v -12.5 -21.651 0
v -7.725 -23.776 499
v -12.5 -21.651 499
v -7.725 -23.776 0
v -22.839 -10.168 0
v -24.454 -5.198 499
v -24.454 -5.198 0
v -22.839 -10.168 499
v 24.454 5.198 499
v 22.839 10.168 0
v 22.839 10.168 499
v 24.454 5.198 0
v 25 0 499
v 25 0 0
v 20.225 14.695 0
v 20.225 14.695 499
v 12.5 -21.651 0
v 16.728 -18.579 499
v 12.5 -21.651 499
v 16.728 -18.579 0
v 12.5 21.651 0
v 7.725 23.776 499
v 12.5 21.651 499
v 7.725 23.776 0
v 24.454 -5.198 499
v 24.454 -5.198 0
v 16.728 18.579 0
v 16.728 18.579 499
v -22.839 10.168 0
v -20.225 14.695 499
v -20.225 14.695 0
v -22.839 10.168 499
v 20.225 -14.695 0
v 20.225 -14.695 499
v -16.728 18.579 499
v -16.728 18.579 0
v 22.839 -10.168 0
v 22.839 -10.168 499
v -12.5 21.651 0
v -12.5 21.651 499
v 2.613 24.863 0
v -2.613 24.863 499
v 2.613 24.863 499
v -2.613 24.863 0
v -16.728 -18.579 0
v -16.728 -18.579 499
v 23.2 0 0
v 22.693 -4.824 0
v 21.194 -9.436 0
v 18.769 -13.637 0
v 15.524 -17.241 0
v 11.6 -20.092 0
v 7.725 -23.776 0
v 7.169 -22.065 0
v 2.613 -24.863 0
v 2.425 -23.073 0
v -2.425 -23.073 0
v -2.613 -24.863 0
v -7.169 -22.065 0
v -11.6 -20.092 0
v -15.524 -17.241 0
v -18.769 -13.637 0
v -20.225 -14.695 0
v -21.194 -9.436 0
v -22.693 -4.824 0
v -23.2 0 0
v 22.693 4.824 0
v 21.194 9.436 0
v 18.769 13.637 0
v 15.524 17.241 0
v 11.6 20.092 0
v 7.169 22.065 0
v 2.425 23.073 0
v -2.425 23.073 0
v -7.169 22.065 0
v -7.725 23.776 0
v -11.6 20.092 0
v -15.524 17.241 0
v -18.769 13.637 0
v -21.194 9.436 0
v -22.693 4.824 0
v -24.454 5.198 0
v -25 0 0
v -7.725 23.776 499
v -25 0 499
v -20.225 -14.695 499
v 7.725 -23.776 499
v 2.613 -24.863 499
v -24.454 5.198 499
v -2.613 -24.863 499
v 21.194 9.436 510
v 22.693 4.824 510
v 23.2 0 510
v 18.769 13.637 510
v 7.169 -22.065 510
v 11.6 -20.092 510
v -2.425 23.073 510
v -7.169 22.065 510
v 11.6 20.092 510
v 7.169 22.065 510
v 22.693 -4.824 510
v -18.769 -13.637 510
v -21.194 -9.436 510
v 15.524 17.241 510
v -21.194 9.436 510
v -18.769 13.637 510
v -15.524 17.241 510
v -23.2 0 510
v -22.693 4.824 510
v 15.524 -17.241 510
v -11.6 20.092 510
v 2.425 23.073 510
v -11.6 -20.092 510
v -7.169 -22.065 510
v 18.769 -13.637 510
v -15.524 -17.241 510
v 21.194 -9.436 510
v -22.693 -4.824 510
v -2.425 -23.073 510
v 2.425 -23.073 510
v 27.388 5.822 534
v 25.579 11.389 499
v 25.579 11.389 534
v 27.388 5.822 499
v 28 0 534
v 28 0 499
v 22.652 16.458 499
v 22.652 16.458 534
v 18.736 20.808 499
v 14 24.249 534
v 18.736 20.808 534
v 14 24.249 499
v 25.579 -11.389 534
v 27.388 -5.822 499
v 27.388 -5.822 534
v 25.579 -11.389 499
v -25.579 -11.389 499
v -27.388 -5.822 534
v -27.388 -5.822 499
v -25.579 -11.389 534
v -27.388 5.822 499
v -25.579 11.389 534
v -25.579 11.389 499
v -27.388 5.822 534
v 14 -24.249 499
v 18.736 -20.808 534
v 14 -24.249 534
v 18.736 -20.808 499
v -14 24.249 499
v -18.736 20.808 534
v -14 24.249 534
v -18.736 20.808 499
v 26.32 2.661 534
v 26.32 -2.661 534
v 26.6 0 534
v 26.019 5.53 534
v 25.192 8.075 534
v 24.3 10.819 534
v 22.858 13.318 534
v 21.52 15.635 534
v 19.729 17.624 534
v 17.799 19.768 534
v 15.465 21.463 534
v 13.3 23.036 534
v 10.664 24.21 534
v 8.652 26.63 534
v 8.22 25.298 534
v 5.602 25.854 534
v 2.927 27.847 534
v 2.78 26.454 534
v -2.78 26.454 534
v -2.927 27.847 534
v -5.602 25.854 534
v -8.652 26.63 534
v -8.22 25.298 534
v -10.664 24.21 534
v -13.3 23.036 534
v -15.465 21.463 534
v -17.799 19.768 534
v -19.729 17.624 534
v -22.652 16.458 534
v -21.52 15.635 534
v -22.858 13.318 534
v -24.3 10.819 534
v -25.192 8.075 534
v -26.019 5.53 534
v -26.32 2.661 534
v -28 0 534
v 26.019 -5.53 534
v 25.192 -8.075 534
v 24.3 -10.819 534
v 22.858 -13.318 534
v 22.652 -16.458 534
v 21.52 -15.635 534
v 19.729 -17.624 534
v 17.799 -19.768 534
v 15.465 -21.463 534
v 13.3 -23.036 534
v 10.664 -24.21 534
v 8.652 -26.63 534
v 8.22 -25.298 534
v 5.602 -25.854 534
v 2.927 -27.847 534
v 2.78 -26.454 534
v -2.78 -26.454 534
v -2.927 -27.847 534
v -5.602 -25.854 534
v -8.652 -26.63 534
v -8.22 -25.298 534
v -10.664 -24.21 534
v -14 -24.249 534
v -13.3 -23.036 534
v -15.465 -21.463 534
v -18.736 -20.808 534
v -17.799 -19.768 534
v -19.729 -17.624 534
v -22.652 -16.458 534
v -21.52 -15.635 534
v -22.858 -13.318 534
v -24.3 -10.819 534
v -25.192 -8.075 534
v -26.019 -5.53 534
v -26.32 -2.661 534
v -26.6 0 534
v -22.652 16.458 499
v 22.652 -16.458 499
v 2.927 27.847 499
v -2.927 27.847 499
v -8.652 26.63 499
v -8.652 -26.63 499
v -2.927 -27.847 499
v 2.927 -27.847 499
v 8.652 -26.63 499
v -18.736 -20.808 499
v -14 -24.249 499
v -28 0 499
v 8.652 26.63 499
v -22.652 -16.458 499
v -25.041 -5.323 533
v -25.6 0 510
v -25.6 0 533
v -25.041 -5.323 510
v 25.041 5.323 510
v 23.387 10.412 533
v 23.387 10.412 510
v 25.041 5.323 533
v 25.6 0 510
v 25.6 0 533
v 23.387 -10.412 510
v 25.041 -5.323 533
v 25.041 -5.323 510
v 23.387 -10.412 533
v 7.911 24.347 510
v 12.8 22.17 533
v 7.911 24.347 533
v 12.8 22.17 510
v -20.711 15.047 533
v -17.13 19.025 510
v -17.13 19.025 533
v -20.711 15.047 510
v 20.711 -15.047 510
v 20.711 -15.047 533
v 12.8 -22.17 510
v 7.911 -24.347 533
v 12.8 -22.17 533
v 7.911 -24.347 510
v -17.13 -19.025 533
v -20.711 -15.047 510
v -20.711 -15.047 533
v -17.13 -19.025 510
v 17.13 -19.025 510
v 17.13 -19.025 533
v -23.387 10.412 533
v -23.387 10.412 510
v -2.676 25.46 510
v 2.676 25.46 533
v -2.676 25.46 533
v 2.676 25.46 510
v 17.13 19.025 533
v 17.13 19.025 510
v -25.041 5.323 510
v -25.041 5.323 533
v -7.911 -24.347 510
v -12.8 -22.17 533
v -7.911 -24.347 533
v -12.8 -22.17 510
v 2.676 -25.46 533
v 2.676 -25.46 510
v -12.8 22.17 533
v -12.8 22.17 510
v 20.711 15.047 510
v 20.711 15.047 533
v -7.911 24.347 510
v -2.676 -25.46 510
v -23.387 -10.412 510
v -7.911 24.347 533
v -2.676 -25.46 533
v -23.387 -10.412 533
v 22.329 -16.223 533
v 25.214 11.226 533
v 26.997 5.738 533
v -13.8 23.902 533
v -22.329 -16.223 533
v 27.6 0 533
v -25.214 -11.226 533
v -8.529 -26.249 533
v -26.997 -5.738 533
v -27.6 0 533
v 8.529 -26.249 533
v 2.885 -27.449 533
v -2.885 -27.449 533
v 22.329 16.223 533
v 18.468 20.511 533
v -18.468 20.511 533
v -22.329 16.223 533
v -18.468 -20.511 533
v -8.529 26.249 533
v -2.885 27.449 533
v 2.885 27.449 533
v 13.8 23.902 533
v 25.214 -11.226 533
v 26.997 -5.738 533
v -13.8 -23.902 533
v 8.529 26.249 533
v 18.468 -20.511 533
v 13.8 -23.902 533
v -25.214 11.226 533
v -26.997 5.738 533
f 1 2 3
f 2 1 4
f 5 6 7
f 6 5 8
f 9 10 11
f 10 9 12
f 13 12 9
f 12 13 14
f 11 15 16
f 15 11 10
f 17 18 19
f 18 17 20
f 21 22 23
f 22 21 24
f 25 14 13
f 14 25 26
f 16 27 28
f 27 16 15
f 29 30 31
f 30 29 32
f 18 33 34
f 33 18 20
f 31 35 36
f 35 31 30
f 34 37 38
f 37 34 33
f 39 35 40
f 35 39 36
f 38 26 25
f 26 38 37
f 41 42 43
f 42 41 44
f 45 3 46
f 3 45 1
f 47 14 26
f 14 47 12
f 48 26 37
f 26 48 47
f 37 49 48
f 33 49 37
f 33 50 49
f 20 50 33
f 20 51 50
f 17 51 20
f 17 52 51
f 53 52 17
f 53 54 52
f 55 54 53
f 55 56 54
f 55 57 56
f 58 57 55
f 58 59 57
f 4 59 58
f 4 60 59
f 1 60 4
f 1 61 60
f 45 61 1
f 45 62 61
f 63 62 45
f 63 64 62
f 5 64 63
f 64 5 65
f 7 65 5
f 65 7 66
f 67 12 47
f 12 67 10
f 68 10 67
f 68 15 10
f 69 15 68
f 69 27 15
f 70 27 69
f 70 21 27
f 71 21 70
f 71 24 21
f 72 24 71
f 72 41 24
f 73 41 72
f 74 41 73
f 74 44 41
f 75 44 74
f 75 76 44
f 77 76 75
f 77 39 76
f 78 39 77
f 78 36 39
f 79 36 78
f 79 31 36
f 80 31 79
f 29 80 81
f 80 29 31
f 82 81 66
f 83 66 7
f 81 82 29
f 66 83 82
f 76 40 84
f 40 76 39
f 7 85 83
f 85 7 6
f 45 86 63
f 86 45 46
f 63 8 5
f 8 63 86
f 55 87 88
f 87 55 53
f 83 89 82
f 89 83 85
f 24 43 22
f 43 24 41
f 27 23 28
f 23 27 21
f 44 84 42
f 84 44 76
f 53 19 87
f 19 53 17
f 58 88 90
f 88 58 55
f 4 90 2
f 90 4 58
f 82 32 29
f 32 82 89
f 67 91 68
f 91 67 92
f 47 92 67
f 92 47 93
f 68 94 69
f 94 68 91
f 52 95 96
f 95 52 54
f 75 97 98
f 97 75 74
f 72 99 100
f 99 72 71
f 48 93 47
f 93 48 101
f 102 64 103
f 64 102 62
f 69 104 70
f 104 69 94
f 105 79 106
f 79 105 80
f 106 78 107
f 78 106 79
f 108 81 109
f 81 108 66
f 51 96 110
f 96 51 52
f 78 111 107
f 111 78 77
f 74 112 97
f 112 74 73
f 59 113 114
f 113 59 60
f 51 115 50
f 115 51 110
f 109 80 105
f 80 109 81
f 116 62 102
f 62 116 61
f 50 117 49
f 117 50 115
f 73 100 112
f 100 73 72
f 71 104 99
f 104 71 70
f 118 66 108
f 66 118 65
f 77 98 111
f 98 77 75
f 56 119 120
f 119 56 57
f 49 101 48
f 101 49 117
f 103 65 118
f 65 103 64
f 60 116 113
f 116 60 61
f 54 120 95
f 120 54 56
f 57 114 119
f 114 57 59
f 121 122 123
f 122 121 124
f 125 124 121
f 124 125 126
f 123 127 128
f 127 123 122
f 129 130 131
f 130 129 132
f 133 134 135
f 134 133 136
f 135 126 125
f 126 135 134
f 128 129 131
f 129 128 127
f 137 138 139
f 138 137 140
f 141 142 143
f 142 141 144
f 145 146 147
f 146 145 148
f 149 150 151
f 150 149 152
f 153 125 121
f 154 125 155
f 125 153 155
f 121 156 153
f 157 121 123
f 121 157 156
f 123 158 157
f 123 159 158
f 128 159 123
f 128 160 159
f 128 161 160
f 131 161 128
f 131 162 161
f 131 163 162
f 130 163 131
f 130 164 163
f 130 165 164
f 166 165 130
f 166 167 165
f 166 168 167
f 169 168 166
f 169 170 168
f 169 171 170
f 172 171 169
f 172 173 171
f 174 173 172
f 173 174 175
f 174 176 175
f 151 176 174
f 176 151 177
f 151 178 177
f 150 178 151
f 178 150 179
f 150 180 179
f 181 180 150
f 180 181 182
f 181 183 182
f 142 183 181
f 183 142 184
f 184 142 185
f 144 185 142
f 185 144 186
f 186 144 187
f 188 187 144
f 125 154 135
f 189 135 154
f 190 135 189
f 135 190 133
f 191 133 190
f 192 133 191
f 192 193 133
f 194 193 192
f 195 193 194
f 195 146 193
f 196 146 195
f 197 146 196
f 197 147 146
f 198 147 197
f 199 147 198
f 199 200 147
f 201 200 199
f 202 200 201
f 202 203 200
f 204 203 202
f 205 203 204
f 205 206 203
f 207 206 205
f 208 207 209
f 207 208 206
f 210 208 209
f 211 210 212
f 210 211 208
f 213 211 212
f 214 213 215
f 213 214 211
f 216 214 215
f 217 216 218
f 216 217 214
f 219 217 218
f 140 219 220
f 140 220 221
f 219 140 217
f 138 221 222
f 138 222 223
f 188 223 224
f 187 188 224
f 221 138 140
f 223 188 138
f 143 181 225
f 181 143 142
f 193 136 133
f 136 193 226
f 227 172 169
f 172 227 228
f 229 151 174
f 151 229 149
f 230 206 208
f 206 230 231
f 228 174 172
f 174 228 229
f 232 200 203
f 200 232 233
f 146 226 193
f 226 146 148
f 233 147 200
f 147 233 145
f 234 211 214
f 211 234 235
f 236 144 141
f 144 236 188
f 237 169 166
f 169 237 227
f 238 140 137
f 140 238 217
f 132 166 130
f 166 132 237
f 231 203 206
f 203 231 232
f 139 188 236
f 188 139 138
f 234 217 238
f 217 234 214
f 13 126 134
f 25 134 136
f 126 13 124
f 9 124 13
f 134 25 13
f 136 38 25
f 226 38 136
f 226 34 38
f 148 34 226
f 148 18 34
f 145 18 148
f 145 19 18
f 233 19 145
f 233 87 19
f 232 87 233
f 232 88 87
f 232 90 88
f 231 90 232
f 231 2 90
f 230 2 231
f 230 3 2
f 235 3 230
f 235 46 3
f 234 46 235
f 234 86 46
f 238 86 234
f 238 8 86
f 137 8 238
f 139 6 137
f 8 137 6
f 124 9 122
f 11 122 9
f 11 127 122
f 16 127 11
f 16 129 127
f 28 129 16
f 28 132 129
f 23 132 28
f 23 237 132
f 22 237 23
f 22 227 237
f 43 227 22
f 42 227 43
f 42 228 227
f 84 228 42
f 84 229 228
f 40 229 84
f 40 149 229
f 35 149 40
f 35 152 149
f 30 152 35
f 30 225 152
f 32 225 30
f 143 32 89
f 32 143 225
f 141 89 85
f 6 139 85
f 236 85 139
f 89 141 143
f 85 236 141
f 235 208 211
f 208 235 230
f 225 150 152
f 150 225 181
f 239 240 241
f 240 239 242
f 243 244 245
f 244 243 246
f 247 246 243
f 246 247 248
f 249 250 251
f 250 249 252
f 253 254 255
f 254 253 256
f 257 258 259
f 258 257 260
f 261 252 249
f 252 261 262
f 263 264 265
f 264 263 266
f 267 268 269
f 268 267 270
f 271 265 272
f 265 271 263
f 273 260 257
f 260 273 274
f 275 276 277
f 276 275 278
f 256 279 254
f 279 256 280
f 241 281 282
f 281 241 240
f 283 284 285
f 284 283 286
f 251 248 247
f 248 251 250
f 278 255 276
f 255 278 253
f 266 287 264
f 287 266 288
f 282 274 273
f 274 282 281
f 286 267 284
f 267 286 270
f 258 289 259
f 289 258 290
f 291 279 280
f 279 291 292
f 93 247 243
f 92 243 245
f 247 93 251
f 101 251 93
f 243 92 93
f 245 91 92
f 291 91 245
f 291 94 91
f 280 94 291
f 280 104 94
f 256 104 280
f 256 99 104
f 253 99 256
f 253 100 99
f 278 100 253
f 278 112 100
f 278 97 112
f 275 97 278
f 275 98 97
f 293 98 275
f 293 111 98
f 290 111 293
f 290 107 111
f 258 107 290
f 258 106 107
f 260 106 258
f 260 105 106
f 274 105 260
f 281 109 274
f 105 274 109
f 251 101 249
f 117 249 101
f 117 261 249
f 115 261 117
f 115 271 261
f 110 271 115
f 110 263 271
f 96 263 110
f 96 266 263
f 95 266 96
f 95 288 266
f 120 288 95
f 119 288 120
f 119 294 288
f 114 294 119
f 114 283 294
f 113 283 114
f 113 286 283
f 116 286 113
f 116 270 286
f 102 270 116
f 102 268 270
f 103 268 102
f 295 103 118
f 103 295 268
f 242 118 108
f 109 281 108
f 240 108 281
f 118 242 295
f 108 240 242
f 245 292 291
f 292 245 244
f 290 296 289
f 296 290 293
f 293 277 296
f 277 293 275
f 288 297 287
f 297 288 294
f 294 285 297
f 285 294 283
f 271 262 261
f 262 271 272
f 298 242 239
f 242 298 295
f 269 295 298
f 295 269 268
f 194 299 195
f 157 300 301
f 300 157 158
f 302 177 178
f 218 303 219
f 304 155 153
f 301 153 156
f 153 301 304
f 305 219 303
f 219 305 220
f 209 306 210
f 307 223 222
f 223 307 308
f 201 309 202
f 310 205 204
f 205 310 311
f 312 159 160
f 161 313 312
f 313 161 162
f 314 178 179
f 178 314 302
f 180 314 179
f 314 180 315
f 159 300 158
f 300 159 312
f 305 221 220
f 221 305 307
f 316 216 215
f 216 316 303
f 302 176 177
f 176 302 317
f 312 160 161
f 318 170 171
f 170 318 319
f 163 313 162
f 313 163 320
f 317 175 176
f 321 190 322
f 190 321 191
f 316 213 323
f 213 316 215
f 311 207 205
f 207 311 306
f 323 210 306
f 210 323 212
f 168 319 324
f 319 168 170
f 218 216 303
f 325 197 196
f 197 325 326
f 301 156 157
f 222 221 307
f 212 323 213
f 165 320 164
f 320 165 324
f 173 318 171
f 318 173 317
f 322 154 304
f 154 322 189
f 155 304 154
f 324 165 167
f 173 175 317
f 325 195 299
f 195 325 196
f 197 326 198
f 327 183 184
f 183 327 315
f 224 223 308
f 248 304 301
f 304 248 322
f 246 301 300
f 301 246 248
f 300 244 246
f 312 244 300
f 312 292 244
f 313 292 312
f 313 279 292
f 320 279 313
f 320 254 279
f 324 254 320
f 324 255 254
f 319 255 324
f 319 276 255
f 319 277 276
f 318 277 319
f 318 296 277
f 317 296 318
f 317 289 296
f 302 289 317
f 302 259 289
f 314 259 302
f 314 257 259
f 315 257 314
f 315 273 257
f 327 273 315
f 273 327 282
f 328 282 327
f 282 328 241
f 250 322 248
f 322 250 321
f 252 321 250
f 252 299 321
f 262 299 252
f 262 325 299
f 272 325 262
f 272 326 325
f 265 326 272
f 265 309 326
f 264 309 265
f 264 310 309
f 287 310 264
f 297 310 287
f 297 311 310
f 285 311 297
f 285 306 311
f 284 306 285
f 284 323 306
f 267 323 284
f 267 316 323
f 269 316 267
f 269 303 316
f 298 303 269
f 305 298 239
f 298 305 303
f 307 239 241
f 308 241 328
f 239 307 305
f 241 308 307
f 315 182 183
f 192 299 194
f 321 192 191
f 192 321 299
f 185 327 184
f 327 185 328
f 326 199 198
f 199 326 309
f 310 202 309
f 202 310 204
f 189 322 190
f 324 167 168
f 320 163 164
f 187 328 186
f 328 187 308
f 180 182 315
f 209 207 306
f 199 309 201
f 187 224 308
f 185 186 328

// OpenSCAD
// Parameters
length_mm = 500; //[250:1000:1]
ht50_outer_diameter_mm = 50; //[40:70:0.5]
ht50_wall_thickness_mm = 1.8; //[1:3.6:0.1]
fitting_length_mm = 35; //[20:70:1]
fitting_outer_diameter_mm = 56; //[50:80:0.5]
fitting_wall_thickness_mm = 2.5; //[1.5:5:0.1]
socket_depth_mm = 25; //[10:50:1]
socket_clearance_mm = 0.6; //[0.2:1.5:0.1]
overlap_mm = 1; //[0.5:2:0.1]
chamfer_height_mm = 2; //[0.5:6:0.1]

// Module for the HT Pipe
module ht_pipe() {
  color([0.85, 0.85, 0.8]) { // PVC color
    difference() {
      // Outer pipe body
      translate([0, 0, 0])
        cylinder(h=length_mm, r=ht50_outer_diameter_mm/2, center=false);
      
      // Inner void of the pipe
      translate([0, 0, -overlap_mm/2])
        cylinder(h=length_mm + overlap_mm, r=ht50_outer_diameter_mm/2 - ht50_wall_thickness_mm, center=false);
    }
    
    // End fitting
    difference() {
      // Outer fitting
      translate([0, 0, length_mm - overlap_mm])
        cylinder(h=fitting_length_mm, r=fitting_outer_diameter_mm/2, center=false);
      
      // Inner through void
      translate([0, 0, length_mm - overlap_mm])
        cylinder(h=fitting_length_mm + overlap_mm, r=ht50_outer_diameter_mm/2 - ht50_wall_thickness_mm, center=false);
      
      // Socket void
      translate([0, 0, length_mm + fitting_length_mm - socket_depth_mm])
        cylinder(h=socket_depth_mm, r=ht50_outer_diameter_mm/2 + socket_clearance_mm, center=false);
      
      // Chamfer void
      translate([0, 0, length_mm + fitting_length_mm - chamfer_height_mm])
        cylinder(h=chamfer_height_mm, r1=ht50_outer_diameter_mm/2 + socket_clearance_mm + chamfer_height_mm, r2=ht50_outer_diameter_mm/2 + socket_clearance_mm, center=false);
    }
  }
}

// Assembly
module assembly() {
  ht_pipe();
}

assembly();
